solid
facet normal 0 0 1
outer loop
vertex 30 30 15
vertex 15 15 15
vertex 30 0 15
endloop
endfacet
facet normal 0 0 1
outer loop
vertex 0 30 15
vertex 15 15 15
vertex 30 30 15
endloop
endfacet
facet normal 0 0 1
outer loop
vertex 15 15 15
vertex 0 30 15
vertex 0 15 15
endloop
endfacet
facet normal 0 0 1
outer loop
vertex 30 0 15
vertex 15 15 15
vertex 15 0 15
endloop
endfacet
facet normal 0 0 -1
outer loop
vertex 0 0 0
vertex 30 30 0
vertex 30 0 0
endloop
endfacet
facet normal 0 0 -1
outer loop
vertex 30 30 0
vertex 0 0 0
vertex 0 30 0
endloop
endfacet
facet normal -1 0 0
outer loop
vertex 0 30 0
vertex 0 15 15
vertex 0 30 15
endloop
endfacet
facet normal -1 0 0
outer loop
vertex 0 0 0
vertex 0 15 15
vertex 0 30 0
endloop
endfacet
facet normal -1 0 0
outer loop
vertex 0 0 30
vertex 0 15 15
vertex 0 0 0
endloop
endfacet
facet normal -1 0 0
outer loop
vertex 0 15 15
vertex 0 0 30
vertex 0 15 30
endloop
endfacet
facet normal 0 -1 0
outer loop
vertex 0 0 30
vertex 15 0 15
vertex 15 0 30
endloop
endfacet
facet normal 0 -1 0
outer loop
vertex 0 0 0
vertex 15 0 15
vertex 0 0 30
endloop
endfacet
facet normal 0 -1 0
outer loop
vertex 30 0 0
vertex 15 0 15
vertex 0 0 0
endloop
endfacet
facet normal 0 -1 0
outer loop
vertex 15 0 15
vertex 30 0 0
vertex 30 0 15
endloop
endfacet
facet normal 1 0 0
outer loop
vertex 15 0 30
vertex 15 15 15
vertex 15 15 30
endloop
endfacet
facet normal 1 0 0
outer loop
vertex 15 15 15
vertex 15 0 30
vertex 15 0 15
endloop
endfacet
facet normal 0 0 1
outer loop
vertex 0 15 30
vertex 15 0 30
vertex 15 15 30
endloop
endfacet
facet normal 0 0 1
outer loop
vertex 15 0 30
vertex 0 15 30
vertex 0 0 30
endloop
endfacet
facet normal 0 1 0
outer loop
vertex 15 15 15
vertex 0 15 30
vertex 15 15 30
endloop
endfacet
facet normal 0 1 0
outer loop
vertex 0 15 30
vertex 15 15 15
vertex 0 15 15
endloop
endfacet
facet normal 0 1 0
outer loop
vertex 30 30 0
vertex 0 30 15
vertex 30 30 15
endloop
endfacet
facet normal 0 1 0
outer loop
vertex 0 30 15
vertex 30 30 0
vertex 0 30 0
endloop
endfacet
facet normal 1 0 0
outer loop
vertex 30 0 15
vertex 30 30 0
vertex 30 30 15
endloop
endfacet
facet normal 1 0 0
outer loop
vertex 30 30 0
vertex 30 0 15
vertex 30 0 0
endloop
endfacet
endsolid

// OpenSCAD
// Fongo piece 9: Stool. GPL-3.0; see README.txt.
// All cube positions derive from the canonical catalogue. z points up.
unit = 15; // mm, scale all pieces AND cards together
positions = [[0,0,0],[0,0,1],[0,1,0],[1,0,0],[1,1,0]];
union() { for (p = positions) translate(p * unit) cube([unit, unit, unit]); }
